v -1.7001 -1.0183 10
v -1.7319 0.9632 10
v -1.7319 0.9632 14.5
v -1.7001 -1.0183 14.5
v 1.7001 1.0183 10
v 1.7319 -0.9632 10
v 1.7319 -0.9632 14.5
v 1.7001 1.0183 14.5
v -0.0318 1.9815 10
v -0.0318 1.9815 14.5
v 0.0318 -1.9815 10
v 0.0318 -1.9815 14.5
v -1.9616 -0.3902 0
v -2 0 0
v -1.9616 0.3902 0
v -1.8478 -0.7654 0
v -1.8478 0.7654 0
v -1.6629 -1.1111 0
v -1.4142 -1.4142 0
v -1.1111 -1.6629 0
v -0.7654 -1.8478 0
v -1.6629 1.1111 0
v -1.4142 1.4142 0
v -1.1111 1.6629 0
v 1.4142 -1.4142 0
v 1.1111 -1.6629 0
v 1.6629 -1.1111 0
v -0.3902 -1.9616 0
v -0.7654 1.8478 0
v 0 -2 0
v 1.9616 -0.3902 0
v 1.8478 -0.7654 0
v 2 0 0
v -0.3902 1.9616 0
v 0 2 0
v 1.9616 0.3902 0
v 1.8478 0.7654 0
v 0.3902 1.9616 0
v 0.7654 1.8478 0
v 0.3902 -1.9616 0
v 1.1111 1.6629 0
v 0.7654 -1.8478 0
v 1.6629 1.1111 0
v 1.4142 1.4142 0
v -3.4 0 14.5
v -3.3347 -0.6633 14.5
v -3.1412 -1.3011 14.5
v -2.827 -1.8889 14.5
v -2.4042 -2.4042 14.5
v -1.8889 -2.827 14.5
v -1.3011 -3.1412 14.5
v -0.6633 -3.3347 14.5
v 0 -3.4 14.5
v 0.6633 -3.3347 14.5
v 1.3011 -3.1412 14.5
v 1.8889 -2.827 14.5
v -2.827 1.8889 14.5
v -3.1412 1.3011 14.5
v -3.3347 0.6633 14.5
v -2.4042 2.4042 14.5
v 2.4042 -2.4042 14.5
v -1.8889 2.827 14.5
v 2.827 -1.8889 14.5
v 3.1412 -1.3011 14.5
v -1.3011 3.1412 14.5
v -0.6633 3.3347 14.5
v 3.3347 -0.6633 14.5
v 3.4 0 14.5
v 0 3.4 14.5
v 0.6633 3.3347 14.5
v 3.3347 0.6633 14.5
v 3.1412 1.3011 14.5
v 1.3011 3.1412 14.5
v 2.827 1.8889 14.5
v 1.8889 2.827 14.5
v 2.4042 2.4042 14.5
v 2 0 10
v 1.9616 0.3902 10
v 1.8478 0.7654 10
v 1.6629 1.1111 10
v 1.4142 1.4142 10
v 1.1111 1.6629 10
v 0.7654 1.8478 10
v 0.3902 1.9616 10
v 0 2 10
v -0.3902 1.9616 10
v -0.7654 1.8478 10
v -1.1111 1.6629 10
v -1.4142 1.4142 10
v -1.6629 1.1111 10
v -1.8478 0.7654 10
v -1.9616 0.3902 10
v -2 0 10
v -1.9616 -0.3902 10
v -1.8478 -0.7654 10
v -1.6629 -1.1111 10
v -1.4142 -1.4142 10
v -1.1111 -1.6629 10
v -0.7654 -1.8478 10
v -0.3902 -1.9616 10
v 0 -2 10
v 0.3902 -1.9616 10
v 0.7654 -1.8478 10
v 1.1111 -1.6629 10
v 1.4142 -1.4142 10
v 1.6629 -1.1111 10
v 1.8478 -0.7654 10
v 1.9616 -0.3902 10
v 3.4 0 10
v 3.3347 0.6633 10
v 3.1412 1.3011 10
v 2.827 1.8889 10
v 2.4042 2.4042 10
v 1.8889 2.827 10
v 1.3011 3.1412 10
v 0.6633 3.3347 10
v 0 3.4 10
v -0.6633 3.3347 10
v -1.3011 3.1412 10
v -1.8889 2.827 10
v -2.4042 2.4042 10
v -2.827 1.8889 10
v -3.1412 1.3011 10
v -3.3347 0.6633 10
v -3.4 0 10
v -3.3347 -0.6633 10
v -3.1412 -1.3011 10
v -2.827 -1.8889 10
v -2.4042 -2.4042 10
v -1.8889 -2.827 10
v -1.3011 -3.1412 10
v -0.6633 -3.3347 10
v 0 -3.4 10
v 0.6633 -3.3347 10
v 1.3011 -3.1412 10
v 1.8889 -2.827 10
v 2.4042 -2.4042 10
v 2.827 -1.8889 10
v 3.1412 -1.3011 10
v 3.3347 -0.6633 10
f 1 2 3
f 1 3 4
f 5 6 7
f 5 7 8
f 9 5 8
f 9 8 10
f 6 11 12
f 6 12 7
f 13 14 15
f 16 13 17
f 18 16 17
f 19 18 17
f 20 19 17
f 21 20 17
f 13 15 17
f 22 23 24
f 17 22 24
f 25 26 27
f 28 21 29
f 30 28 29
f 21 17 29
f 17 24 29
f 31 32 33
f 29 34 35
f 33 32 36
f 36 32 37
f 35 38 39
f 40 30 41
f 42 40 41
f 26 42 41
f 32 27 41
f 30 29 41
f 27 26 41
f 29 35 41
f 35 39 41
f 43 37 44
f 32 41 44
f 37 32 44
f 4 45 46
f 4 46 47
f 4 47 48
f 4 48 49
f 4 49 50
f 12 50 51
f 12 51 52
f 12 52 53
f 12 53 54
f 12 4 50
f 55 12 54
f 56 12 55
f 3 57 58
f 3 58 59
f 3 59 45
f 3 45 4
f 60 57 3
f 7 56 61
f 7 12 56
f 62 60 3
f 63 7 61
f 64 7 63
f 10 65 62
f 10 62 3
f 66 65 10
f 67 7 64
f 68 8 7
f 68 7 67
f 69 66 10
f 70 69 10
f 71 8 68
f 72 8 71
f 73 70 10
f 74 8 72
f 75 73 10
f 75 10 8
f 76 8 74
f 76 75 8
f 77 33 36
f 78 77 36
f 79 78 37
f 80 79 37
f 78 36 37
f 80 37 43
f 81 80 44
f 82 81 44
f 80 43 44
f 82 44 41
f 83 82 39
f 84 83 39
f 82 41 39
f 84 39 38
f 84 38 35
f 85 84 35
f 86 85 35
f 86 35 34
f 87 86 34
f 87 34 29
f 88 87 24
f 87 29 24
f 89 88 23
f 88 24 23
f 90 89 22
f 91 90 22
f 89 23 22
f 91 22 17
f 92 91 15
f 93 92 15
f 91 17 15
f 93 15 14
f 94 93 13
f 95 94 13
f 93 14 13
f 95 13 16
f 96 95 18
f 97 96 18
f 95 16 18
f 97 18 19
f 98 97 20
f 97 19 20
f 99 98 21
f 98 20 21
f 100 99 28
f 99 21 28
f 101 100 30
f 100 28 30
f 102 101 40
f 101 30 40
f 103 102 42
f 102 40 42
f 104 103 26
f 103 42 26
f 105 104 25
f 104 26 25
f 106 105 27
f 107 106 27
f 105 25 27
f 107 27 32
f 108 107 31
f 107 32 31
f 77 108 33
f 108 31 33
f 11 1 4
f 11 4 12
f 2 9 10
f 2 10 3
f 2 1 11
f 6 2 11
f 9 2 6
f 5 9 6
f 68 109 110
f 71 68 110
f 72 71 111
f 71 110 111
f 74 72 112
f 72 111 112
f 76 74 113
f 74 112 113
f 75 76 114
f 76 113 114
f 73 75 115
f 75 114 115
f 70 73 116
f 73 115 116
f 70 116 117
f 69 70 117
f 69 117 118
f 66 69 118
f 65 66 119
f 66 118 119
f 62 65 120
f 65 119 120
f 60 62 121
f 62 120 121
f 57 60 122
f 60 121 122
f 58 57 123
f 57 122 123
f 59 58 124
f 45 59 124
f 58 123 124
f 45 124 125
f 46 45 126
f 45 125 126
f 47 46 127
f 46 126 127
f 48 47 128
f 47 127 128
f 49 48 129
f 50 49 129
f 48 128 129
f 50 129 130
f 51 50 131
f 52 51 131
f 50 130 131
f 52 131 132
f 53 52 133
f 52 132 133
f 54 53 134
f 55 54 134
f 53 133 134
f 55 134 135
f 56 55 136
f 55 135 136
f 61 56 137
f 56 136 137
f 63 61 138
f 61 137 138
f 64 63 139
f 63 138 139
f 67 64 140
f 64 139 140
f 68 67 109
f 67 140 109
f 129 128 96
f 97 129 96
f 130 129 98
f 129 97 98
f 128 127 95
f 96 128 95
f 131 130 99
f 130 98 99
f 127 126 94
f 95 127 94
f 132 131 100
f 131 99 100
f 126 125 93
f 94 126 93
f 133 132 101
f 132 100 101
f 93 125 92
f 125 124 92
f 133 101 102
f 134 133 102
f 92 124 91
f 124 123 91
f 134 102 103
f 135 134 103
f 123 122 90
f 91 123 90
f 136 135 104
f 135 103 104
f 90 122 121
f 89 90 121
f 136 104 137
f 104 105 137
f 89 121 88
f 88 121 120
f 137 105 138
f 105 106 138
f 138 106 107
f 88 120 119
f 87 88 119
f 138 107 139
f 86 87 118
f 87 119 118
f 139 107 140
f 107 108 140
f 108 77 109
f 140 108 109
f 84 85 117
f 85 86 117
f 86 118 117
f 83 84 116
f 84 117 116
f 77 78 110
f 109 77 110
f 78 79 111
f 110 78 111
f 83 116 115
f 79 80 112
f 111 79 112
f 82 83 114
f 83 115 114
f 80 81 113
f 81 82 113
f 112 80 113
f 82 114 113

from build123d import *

# Parameters (mm, degrees)
SKETCH_1_R      = 2
EXTRUDE_1_DEPTH = 10
SKETCH_2_R      = 3.4
EXTRUDE_2_DEPTH = 4.5


with BuildPart() as part:
    # 草图1 → 拉伸1 (new body)
    with BuildSketch(Plane.XY):
        Circle(SKETCH_1_R)
    extrude(amount=EXTRUDE_1_DEPTH)

    # 草图2 → 拉伸2 (add)
    with BuildSketch(Plane.XY.offset(10)):
        Circle(SKETCH_2_R)
        Polygon((-0.031811461, 1.981453179), (-1.73189452, 0.963177056), (-1.700083059, -1.018276123), (0.031811461, -1.981453179), (1.73189452, -0.963177056), (1.700083059, 1.018276123), align=None, mode=Mode.SUBTRACT)
    extrude(amount=EXTRUDE_2_DEPTH)


solid = part.part
